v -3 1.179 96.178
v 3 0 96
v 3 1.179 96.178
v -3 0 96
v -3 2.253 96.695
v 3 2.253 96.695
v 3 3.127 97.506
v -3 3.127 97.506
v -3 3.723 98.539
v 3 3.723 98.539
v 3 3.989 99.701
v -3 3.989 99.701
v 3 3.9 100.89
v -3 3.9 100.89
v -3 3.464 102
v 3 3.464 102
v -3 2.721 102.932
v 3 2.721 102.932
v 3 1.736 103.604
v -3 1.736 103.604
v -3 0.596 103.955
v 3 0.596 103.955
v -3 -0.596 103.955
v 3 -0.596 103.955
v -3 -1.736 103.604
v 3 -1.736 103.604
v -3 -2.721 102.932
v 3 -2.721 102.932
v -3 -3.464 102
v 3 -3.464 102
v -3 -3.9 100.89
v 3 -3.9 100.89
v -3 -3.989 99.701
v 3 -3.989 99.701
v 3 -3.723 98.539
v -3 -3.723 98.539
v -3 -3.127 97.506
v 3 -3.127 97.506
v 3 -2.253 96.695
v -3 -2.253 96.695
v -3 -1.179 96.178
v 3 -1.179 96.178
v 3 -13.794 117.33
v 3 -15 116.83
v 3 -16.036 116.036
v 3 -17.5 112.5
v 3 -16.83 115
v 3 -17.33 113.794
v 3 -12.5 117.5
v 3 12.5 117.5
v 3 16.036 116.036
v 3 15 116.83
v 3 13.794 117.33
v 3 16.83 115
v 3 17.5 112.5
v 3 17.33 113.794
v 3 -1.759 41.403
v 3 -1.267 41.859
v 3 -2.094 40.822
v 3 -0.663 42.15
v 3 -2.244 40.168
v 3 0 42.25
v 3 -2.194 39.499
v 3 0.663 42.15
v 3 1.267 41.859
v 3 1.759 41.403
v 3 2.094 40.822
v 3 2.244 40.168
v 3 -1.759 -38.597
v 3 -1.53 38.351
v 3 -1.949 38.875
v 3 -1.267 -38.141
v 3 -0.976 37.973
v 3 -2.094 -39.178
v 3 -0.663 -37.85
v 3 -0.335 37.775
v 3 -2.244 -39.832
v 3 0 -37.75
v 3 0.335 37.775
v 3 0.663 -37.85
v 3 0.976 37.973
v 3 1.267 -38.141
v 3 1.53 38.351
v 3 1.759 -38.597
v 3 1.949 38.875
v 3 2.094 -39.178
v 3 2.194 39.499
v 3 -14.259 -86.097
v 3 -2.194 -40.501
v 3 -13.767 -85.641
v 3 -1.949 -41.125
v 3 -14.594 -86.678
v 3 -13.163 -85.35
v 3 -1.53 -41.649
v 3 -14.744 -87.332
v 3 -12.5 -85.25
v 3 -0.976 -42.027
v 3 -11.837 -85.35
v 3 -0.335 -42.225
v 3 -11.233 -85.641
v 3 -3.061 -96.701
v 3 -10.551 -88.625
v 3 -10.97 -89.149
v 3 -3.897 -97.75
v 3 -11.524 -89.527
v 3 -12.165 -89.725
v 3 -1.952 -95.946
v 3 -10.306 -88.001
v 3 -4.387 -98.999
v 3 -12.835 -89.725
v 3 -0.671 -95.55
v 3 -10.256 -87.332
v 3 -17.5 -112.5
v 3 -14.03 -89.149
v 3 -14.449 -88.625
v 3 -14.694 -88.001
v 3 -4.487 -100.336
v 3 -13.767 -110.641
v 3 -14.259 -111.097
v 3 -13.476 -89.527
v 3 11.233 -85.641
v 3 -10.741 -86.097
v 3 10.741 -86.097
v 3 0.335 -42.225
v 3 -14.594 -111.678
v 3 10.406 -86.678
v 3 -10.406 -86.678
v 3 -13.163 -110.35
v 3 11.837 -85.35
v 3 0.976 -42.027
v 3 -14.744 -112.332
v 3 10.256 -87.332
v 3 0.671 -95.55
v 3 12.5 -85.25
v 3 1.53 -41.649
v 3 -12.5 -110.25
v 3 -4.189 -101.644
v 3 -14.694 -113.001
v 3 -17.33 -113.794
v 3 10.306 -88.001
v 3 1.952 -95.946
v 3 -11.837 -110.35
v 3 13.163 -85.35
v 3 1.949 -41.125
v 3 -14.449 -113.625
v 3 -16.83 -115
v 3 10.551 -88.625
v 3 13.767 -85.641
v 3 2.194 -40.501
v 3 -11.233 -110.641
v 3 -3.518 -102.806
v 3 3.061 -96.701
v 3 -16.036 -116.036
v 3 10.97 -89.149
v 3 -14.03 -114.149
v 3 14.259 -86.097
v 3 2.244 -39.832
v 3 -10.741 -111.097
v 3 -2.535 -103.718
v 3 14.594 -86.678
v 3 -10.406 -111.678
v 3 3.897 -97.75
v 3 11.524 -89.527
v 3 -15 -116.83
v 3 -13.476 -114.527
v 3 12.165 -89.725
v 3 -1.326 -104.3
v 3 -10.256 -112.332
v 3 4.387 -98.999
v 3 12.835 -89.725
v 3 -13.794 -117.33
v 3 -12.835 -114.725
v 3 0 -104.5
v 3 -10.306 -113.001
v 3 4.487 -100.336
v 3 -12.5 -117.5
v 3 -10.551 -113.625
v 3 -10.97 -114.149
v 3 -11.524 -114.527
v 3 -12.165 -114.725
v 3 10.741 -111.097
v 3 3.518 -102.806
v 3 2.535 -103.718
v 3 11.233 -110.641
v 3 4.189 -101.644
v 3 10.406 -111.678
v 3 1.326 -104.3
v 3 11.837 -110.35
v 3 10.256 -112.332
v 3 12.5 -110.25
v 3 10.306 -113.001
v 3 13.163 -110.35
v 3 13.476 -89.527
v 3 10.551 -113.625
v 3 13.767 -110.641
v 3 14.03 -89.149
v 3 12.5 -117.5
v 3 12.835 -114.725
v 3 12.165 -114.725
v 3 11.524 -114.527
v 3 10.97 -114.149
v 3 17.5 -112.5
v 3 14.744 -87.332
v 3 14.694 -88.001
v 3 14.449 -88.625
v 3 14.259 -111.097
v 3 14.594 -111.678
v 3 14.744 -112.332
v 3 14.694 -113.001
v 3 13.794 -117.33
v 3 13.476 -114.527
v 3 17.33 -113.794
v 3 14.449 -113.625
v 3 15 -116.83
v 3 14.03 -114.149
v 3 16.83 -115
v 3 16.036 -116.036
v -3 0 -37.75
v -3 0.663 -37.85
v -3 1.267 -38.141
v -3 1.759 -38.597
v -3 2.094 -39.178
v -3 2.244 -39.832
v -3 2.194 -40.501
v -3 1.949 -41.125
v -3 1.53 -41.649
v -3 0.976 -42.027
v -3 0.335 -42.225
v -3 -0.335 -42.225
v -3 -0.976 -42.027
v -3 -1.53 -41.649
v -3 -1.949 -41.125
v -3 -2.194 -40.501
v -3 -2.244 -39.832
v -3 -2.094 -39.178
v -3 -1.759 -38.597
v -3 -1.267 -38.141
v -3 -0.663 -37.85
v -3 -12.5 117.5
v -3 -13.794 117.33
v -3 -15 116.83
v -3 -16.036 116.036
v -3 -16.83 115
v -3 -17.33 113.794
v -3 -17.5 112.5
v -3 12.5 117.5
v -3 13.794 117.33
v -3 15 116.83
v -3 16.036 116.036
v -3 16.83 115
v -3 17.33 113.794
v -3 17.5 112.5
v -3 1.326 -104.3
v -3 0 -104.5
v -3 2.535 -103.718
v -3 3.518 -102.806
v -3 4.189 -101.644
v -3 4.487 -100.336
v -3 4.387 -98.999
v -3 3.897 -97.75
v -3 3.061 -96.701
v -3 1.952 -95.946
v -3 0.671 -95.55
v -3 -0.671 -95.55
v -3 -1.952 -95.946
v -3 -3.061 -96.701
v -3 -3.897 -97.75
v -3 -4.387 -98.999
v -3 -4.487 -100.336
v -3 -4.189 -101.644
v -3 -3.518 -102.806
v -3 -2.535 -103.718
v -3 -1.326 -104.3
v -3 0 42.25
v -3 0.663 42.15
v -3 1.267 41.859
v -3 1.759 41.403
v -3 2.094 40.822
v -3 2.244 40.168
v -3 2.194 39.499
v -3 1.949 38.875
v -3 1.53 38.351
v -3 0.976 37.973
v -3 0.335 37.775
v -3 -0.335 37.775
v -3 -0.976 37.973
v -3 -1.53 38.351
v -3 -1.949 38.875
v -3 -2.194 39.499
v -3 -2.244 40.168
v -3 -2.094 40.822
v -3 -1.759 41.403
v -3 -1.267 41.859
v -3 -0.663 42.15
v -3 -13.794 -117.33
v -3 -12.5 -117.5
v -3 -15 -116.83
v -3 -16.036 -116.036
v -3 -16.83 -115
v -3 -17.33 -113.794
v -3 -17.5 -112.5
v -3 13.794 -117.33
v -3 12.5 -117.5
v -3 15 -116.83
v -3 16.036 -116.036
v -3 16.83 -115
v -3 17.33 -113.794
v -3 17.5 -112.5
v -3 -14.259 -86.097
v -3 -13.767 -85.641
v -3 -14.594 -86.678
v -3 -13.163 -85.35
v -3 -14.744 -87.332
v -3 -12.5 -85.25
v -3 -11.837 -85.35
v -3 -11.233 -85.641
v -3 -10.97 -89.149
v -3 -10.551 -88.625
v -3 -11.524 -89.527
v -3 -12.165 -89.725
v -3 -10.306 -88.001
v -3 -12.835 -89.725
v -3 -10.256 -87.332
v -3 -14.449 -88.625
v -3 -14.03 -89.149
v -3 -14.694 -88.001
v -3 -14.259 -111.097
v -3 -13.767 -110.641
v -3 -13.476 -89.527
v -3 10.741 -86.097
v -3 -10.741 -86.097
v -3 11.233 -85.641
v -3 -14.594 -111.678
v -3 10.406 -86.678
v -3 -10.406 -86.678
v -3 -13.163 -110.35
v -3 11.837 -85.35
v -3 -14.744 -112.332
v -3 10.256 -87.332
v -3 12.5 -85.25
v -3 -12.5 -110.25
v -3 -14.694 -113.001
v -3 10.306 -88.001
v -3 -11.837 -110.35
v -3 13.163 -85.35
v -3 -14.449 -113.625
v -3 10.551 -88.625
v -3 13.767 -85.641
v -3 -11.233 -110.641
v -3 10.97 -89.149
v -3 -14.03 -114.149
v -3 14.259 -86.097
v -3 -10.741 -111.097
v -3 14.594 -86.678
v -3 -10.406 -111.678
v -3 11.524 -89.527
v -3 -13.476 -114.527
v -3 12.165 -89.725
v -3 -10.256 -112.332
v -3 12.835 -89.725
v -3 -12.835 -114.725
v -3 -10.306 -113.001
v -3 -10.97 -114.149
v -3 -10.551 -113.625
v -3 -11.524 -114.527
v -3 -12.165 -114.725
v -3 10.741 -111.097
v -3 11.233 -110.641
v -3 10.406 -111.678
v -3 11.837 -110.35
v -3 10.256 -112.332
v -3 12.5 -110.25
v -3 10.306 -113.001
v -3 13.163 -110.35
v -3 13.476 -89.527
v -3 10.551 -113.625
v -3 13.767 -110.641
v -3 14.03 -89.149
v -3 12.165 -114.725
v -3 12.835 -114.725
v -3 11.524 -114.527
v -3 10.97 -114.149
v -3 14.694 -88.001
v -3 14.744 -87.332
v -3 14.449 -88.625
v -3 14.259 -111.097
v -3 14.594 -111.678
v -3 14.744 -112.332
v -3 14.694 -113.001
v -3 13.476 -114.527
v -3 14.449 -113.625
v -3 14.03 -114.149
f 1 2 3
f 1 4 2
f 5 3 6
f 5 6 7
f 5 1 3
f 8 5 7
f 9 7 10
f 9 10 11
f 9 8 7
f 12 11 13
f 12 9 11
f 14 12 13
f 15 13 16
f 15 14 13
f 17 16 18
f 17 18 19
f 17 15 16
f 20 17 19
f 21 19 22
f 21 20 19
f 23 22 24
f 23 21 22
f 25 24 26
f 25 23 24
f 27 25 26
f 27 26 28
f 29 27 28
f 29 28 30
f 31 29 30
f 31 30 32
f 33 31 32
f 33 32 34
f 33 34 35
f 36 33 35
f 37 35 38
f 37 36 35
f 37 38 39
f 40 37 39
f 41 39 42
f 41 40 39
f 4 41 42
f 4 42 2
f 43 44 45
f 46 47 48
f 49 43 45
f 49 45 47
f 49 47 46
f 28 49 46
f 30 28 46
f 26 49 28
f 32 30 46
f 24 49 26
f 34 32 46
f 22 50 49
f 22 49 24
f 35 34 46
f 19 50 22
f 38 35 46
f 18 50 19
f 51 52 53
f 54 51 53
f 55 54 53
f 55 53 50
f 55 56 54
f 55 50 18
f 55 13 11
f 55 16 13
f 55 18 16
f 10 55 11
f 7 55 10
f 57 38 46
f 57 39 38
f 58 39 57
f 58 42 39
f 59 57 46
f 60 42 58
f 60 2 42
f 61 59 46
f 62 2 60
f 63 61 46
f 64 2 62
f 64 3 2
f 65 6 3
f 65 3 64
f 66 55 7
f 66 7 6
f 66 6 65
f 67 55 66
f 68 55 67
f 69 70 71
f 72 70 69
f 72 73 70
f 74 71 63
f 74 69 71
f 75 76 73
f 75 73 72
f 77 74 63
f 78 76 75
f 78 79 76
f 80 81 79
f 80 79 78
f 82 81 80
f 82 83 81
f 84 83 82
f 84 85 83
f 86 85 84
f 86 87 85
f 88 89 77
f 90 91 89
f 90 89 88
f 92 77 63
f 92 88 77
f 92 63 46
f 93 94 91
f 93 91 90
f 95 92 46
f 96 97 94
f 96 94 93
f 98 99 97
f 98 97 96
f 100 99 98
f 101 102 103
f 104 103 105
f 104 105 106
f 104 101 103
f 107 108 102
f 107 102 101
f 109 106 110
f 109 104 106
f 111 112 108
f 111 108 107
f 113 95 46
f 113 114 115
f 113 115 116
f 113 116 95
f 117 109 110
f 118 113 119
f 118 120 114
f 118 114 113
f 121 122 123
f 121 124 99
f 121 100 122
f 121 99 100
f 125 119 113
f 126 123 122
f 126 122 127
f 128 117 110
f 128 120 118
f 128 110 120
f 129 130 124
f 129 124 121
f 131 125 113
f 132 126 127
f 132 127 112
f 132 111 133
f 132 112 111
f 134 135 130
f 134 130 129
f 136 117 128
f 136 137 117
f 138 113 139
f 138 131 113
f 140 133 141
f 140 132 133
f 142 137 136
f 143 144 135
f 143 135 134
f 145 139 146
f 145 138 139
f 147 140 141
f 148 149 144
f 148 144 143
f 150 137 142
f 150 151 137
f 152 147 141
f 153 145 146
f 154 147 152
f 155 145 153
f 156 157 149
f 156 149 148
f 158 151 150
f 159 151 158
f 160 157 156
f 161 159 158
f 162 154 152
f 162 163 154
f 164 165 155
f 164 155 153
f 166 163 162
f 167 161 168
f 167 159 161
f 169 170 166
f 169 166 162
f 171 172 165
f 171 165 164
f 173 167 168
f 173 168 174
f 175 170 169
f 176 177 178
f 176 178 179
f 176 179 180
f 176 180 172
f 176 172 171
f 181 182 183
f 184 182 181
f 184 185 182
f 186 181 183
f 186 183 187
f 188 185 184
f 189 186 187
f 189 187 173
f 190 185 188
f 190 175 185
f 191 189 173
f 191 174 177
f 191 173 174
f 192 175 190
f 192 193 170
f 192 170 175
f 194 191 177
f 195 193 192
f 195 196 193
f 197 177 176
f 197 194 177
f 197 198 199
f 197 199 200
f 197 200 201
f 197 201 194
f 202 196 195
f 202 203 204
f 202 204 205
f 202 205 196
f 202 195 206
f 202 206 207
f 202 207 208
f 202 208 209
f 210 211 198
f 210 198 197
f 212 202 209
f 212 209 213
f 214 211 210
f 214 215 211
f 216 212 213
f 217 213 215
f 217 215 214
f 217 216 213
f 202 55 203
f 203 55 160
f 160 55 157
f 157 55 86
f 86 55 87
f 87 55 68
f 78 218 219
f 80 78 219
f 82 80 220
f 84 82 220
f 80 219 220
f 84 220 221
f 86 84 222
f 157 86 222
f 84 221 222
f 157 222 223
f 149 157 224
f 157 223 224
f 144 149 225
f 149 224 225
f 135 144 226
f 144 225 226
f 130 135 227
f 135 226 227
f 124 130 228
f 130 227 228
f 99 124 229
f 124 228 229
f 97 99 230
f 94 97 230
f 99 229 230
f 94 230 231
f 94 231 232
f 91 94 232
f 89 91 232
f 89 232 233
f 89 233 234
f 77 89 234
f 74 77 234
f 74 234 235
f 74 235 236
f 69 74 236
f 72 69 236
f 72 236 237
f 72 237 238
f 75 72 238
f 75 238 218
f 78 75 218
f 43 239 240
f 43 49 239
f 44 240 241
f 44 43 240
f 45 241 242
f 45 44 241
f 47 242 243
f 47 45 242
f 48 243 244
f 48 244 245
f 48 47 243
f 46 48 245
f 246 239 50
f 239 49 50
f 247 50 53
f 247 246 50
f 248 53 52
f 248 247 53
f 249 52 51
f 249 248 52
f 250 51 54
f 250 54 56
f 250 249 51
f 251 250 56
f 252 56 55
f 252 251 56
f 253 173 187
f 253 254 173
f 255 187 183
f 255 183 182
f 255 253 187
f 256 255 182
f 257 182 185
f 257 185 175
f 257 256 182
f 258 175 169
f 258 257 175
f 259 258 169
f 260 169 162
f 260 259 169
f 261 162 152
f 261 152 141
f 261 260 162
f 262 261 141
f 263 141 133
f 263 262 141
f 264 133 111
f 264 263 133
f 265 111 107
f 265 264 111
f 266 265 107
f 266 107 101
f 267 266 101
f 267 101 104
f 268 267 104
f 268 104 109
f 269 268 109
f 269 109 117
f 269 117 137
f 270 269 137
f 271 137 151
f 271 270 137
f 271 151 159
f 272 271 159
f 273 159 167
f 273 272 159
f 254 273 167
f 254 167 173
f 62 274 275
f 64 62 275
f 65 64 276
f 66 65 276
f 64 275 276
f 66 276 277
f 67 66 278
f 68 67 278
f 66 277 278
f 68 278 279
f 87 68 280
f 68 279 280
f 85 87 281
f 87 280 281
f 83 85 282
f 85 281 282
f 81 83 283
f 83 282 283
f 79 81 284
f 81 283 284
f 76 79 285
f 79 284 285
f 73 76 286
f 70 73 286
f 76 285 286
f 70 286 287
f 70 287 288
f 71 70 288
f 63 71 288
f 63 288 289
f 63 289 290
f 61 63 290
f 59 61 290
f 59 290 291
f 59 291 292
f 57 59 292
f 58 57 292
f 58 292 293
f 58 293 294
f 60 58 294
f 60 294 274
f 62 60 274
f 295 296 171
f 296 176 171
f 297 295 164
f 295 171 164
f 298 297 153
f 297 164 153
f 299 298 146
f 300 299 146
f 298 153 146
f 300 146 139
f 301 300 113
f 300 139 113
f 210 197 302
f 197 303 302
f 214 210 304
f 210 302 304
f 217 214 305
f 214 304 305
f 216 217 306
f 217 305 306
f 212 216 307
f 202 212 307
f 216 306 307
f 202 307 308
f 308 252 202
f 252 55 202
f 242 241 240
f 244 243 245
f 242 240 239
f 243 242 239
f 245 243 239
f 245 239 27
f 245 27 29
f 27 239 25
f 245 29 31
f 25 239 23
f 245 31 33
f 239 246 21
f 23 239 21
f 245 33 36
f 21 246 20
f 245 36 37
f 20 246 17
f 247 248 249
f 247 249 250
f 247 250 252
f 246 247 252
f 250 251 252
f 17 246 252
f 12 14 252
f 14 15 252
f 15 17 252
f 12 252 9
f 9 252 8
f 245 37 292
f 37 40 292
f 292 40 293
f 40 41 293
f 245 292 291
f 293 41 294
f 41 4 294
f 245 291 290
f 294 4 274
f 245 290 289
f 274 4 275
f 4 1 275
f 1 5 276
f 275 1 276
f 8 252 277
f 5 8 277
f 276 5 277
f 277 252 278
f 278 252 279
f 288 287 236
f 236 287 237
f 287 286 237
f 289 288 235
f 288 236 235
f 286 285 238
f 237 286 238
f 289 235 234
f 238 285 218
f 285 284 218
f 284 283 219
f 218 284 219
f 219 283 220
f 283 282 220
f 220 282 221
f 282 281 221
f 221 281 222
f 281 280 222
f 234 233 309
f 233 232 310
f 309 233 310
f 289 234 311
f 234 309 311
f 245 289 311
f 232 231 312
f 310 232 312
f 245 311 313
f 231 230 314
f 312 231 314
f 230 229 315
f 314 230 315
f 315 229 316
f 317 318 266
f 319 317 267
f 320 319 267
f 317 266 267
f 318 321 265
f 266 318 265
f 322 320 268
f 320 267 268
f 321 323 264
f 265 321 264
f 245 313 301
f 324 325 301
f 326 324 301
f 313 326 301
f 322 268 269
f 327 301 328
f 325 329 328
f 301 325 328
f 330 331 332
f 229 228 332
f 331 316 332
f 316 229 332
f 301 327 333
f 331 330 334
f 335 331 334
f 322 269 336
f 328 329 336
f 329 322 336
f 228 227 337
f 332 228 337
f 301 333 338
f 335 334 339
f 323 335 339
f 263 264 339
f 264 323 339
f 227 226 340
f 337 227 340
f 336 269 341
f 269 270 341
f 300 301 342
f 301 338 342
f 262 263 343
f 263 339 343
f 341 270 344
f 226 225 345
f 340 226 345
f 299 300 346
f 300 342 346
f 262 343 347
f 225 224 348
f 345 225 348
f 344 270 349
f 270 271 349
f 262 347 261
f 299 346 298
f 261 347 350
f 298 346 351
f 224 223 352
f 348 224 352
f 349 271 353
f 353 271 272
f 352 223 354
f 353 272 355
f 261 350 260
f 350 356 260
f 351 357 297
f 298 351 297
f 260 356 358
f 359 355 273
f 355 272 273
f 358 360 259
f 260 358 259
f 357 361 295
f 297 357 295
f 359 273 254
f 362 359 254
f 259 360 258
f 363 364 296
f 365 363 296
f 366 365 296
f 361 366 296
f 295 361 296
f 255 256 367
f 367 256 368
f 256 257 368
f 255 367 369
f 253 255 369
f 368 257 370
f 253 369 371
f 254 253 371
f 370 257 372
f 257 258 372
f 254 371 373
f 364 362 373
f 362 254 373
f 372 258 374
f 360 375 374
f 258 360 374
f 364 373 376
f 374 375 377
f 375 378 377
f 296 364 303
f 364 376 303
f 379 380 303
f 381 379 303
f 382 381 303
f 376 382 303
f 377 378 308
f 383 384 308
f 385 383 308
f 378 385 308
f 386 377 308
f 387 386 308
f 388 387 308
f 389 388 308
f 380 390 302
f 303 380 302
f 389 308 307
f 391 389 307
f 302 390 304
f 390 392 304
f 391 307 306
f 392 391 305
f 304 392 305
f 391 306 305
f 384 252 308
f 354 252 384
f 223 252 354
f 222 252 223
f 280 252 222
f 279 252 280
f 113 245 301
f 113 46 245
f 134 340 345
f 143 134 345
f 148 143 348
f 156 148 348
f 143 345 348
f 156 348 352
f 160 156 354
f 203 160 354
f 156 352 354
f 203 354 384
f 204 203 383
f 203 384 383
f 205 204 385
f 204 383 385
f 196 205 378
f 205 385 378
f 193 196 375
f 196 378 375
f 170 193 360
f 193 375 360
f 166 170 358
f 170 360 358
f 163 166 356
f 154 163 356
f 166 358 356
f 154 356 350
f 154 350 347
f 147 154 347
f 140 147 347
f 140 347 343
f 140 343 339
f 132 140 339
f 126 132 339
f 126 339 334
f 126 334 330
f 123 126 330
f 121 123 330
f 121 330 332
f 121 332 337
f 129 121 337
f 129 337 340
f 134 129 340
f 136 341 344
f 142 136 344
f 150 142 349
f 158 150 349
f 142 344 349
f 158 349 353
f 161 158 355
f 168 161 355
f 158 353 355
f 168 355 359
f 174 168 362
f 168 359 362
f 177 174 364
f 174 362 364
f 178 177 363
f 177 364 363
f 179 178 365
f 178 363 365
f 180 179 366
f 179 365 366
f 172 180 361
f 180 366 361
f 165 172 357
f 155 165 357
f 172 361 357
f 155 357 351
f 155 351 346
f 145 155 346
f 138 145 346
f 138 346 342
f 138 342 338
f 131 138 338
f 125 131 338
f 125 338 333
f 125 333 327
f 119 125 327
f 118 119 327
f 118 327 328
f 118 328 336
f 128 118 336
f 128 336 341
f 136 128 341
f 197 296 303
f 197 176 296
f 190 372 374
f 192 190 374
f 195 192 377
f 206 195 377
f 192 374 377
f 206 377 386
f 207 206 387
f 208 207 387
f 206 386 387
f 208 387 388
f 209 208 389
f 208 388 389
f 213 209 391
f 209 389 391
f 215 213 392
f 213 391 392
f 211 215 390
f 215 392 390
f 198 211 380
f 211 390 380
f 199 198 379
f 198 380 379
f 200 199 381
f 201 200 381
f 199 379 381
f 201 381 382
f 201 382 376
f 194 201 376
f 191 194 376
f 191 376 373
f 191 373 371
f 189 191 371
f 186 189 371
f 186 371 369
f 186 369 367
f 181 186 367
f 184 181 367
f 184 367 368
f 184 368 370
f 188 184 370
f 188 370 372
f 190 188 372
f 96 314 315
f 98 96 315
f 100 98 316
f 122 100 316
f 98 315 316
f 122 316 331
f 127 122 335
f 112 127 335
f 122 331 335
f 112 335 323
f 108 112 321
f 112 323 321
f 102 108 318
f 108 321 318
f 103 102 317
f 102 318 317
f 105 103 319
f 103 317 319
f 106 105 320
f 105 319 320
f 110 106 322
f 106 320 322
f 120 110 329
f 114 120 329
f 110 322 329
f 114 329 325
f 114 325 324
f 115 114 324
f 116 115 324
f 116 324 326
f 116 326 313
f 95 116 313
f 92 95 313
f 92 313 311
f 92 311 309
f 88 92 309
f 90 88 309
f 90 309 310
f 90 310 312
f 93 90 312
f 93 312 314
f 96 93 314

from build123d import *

# Parameters (mm, degrees)
CROQUIS2_W                   = 235
CROQUIS2_H                   = 35
CROQUIS2_R                   = 4
CROQUIS2_R_2                 = 4.5
SALIENTE_EXTRUIR1_DEPTH      = 3
REDONDEO1_R                  = 5
TALADRO_DE_MARGEN_PARA_M41_D = 4.5
TALADRO_DE_MARGEN_PARA_M42_D = 4.5


with BuildPart() as part:
    # Croquis2 → Saliente-Extruir1 (new, symmetric)
    with BuildSketch(Plane(origin=(0, 0, 0), x_dir=(0, 0, -1), z_dir=(1, 0, 0))):
        Rectangle(CROQUIS2_W, CROQUIS2_H)
        with Locations((-100, 0)):
            Circle(CROQUIS2_R, mode=Mode.SUBTRACT)
        with Locations((100, 0)):
            Circle(CROQUIS2_R_2, mode=Mode.SUBTRACT)
    extrude(amount=SALIENTE_EXTRUIR1_DEPTH, both=True)

    # Redondeo1
    redondeo1_edges = [part.edges().sort_by_distance(p)[0] for p in [
        (0, 17.5, 117.5),
        (0, 17.5, -117.5),
        (0, -17.5, -117.5),
        (0, -17.5, 117.5),
    ]]
    fillet(redondeo1_edges, radius=REDONDEO1_R)

    # Taladro de margen para M41 (through all)
    with Locations(Plane(origin=(3, 0, 0), x_dir=(0, 0, -1), z_dir=(1, 0, 0))):
        with Locations((112.5, 12.5), (87.5, 12.5), (87.5, -12.5), (112.5, -12.5)):
            Hole(TALADRO_DE_MARGEN_PARA_M41_D / 2)

    # Taladro de margen para M42 (through all)
    with Locations(Plane(origin=(3, 0, 0), x_dir=(0, 0, -1), z_dir=(1, 0, 0))):
        with Locations((-40, 0), (40, 0)):
            Hole(TALADRO_DE_MARGEN_PARA_M42_D / 2)


solid = part.part
